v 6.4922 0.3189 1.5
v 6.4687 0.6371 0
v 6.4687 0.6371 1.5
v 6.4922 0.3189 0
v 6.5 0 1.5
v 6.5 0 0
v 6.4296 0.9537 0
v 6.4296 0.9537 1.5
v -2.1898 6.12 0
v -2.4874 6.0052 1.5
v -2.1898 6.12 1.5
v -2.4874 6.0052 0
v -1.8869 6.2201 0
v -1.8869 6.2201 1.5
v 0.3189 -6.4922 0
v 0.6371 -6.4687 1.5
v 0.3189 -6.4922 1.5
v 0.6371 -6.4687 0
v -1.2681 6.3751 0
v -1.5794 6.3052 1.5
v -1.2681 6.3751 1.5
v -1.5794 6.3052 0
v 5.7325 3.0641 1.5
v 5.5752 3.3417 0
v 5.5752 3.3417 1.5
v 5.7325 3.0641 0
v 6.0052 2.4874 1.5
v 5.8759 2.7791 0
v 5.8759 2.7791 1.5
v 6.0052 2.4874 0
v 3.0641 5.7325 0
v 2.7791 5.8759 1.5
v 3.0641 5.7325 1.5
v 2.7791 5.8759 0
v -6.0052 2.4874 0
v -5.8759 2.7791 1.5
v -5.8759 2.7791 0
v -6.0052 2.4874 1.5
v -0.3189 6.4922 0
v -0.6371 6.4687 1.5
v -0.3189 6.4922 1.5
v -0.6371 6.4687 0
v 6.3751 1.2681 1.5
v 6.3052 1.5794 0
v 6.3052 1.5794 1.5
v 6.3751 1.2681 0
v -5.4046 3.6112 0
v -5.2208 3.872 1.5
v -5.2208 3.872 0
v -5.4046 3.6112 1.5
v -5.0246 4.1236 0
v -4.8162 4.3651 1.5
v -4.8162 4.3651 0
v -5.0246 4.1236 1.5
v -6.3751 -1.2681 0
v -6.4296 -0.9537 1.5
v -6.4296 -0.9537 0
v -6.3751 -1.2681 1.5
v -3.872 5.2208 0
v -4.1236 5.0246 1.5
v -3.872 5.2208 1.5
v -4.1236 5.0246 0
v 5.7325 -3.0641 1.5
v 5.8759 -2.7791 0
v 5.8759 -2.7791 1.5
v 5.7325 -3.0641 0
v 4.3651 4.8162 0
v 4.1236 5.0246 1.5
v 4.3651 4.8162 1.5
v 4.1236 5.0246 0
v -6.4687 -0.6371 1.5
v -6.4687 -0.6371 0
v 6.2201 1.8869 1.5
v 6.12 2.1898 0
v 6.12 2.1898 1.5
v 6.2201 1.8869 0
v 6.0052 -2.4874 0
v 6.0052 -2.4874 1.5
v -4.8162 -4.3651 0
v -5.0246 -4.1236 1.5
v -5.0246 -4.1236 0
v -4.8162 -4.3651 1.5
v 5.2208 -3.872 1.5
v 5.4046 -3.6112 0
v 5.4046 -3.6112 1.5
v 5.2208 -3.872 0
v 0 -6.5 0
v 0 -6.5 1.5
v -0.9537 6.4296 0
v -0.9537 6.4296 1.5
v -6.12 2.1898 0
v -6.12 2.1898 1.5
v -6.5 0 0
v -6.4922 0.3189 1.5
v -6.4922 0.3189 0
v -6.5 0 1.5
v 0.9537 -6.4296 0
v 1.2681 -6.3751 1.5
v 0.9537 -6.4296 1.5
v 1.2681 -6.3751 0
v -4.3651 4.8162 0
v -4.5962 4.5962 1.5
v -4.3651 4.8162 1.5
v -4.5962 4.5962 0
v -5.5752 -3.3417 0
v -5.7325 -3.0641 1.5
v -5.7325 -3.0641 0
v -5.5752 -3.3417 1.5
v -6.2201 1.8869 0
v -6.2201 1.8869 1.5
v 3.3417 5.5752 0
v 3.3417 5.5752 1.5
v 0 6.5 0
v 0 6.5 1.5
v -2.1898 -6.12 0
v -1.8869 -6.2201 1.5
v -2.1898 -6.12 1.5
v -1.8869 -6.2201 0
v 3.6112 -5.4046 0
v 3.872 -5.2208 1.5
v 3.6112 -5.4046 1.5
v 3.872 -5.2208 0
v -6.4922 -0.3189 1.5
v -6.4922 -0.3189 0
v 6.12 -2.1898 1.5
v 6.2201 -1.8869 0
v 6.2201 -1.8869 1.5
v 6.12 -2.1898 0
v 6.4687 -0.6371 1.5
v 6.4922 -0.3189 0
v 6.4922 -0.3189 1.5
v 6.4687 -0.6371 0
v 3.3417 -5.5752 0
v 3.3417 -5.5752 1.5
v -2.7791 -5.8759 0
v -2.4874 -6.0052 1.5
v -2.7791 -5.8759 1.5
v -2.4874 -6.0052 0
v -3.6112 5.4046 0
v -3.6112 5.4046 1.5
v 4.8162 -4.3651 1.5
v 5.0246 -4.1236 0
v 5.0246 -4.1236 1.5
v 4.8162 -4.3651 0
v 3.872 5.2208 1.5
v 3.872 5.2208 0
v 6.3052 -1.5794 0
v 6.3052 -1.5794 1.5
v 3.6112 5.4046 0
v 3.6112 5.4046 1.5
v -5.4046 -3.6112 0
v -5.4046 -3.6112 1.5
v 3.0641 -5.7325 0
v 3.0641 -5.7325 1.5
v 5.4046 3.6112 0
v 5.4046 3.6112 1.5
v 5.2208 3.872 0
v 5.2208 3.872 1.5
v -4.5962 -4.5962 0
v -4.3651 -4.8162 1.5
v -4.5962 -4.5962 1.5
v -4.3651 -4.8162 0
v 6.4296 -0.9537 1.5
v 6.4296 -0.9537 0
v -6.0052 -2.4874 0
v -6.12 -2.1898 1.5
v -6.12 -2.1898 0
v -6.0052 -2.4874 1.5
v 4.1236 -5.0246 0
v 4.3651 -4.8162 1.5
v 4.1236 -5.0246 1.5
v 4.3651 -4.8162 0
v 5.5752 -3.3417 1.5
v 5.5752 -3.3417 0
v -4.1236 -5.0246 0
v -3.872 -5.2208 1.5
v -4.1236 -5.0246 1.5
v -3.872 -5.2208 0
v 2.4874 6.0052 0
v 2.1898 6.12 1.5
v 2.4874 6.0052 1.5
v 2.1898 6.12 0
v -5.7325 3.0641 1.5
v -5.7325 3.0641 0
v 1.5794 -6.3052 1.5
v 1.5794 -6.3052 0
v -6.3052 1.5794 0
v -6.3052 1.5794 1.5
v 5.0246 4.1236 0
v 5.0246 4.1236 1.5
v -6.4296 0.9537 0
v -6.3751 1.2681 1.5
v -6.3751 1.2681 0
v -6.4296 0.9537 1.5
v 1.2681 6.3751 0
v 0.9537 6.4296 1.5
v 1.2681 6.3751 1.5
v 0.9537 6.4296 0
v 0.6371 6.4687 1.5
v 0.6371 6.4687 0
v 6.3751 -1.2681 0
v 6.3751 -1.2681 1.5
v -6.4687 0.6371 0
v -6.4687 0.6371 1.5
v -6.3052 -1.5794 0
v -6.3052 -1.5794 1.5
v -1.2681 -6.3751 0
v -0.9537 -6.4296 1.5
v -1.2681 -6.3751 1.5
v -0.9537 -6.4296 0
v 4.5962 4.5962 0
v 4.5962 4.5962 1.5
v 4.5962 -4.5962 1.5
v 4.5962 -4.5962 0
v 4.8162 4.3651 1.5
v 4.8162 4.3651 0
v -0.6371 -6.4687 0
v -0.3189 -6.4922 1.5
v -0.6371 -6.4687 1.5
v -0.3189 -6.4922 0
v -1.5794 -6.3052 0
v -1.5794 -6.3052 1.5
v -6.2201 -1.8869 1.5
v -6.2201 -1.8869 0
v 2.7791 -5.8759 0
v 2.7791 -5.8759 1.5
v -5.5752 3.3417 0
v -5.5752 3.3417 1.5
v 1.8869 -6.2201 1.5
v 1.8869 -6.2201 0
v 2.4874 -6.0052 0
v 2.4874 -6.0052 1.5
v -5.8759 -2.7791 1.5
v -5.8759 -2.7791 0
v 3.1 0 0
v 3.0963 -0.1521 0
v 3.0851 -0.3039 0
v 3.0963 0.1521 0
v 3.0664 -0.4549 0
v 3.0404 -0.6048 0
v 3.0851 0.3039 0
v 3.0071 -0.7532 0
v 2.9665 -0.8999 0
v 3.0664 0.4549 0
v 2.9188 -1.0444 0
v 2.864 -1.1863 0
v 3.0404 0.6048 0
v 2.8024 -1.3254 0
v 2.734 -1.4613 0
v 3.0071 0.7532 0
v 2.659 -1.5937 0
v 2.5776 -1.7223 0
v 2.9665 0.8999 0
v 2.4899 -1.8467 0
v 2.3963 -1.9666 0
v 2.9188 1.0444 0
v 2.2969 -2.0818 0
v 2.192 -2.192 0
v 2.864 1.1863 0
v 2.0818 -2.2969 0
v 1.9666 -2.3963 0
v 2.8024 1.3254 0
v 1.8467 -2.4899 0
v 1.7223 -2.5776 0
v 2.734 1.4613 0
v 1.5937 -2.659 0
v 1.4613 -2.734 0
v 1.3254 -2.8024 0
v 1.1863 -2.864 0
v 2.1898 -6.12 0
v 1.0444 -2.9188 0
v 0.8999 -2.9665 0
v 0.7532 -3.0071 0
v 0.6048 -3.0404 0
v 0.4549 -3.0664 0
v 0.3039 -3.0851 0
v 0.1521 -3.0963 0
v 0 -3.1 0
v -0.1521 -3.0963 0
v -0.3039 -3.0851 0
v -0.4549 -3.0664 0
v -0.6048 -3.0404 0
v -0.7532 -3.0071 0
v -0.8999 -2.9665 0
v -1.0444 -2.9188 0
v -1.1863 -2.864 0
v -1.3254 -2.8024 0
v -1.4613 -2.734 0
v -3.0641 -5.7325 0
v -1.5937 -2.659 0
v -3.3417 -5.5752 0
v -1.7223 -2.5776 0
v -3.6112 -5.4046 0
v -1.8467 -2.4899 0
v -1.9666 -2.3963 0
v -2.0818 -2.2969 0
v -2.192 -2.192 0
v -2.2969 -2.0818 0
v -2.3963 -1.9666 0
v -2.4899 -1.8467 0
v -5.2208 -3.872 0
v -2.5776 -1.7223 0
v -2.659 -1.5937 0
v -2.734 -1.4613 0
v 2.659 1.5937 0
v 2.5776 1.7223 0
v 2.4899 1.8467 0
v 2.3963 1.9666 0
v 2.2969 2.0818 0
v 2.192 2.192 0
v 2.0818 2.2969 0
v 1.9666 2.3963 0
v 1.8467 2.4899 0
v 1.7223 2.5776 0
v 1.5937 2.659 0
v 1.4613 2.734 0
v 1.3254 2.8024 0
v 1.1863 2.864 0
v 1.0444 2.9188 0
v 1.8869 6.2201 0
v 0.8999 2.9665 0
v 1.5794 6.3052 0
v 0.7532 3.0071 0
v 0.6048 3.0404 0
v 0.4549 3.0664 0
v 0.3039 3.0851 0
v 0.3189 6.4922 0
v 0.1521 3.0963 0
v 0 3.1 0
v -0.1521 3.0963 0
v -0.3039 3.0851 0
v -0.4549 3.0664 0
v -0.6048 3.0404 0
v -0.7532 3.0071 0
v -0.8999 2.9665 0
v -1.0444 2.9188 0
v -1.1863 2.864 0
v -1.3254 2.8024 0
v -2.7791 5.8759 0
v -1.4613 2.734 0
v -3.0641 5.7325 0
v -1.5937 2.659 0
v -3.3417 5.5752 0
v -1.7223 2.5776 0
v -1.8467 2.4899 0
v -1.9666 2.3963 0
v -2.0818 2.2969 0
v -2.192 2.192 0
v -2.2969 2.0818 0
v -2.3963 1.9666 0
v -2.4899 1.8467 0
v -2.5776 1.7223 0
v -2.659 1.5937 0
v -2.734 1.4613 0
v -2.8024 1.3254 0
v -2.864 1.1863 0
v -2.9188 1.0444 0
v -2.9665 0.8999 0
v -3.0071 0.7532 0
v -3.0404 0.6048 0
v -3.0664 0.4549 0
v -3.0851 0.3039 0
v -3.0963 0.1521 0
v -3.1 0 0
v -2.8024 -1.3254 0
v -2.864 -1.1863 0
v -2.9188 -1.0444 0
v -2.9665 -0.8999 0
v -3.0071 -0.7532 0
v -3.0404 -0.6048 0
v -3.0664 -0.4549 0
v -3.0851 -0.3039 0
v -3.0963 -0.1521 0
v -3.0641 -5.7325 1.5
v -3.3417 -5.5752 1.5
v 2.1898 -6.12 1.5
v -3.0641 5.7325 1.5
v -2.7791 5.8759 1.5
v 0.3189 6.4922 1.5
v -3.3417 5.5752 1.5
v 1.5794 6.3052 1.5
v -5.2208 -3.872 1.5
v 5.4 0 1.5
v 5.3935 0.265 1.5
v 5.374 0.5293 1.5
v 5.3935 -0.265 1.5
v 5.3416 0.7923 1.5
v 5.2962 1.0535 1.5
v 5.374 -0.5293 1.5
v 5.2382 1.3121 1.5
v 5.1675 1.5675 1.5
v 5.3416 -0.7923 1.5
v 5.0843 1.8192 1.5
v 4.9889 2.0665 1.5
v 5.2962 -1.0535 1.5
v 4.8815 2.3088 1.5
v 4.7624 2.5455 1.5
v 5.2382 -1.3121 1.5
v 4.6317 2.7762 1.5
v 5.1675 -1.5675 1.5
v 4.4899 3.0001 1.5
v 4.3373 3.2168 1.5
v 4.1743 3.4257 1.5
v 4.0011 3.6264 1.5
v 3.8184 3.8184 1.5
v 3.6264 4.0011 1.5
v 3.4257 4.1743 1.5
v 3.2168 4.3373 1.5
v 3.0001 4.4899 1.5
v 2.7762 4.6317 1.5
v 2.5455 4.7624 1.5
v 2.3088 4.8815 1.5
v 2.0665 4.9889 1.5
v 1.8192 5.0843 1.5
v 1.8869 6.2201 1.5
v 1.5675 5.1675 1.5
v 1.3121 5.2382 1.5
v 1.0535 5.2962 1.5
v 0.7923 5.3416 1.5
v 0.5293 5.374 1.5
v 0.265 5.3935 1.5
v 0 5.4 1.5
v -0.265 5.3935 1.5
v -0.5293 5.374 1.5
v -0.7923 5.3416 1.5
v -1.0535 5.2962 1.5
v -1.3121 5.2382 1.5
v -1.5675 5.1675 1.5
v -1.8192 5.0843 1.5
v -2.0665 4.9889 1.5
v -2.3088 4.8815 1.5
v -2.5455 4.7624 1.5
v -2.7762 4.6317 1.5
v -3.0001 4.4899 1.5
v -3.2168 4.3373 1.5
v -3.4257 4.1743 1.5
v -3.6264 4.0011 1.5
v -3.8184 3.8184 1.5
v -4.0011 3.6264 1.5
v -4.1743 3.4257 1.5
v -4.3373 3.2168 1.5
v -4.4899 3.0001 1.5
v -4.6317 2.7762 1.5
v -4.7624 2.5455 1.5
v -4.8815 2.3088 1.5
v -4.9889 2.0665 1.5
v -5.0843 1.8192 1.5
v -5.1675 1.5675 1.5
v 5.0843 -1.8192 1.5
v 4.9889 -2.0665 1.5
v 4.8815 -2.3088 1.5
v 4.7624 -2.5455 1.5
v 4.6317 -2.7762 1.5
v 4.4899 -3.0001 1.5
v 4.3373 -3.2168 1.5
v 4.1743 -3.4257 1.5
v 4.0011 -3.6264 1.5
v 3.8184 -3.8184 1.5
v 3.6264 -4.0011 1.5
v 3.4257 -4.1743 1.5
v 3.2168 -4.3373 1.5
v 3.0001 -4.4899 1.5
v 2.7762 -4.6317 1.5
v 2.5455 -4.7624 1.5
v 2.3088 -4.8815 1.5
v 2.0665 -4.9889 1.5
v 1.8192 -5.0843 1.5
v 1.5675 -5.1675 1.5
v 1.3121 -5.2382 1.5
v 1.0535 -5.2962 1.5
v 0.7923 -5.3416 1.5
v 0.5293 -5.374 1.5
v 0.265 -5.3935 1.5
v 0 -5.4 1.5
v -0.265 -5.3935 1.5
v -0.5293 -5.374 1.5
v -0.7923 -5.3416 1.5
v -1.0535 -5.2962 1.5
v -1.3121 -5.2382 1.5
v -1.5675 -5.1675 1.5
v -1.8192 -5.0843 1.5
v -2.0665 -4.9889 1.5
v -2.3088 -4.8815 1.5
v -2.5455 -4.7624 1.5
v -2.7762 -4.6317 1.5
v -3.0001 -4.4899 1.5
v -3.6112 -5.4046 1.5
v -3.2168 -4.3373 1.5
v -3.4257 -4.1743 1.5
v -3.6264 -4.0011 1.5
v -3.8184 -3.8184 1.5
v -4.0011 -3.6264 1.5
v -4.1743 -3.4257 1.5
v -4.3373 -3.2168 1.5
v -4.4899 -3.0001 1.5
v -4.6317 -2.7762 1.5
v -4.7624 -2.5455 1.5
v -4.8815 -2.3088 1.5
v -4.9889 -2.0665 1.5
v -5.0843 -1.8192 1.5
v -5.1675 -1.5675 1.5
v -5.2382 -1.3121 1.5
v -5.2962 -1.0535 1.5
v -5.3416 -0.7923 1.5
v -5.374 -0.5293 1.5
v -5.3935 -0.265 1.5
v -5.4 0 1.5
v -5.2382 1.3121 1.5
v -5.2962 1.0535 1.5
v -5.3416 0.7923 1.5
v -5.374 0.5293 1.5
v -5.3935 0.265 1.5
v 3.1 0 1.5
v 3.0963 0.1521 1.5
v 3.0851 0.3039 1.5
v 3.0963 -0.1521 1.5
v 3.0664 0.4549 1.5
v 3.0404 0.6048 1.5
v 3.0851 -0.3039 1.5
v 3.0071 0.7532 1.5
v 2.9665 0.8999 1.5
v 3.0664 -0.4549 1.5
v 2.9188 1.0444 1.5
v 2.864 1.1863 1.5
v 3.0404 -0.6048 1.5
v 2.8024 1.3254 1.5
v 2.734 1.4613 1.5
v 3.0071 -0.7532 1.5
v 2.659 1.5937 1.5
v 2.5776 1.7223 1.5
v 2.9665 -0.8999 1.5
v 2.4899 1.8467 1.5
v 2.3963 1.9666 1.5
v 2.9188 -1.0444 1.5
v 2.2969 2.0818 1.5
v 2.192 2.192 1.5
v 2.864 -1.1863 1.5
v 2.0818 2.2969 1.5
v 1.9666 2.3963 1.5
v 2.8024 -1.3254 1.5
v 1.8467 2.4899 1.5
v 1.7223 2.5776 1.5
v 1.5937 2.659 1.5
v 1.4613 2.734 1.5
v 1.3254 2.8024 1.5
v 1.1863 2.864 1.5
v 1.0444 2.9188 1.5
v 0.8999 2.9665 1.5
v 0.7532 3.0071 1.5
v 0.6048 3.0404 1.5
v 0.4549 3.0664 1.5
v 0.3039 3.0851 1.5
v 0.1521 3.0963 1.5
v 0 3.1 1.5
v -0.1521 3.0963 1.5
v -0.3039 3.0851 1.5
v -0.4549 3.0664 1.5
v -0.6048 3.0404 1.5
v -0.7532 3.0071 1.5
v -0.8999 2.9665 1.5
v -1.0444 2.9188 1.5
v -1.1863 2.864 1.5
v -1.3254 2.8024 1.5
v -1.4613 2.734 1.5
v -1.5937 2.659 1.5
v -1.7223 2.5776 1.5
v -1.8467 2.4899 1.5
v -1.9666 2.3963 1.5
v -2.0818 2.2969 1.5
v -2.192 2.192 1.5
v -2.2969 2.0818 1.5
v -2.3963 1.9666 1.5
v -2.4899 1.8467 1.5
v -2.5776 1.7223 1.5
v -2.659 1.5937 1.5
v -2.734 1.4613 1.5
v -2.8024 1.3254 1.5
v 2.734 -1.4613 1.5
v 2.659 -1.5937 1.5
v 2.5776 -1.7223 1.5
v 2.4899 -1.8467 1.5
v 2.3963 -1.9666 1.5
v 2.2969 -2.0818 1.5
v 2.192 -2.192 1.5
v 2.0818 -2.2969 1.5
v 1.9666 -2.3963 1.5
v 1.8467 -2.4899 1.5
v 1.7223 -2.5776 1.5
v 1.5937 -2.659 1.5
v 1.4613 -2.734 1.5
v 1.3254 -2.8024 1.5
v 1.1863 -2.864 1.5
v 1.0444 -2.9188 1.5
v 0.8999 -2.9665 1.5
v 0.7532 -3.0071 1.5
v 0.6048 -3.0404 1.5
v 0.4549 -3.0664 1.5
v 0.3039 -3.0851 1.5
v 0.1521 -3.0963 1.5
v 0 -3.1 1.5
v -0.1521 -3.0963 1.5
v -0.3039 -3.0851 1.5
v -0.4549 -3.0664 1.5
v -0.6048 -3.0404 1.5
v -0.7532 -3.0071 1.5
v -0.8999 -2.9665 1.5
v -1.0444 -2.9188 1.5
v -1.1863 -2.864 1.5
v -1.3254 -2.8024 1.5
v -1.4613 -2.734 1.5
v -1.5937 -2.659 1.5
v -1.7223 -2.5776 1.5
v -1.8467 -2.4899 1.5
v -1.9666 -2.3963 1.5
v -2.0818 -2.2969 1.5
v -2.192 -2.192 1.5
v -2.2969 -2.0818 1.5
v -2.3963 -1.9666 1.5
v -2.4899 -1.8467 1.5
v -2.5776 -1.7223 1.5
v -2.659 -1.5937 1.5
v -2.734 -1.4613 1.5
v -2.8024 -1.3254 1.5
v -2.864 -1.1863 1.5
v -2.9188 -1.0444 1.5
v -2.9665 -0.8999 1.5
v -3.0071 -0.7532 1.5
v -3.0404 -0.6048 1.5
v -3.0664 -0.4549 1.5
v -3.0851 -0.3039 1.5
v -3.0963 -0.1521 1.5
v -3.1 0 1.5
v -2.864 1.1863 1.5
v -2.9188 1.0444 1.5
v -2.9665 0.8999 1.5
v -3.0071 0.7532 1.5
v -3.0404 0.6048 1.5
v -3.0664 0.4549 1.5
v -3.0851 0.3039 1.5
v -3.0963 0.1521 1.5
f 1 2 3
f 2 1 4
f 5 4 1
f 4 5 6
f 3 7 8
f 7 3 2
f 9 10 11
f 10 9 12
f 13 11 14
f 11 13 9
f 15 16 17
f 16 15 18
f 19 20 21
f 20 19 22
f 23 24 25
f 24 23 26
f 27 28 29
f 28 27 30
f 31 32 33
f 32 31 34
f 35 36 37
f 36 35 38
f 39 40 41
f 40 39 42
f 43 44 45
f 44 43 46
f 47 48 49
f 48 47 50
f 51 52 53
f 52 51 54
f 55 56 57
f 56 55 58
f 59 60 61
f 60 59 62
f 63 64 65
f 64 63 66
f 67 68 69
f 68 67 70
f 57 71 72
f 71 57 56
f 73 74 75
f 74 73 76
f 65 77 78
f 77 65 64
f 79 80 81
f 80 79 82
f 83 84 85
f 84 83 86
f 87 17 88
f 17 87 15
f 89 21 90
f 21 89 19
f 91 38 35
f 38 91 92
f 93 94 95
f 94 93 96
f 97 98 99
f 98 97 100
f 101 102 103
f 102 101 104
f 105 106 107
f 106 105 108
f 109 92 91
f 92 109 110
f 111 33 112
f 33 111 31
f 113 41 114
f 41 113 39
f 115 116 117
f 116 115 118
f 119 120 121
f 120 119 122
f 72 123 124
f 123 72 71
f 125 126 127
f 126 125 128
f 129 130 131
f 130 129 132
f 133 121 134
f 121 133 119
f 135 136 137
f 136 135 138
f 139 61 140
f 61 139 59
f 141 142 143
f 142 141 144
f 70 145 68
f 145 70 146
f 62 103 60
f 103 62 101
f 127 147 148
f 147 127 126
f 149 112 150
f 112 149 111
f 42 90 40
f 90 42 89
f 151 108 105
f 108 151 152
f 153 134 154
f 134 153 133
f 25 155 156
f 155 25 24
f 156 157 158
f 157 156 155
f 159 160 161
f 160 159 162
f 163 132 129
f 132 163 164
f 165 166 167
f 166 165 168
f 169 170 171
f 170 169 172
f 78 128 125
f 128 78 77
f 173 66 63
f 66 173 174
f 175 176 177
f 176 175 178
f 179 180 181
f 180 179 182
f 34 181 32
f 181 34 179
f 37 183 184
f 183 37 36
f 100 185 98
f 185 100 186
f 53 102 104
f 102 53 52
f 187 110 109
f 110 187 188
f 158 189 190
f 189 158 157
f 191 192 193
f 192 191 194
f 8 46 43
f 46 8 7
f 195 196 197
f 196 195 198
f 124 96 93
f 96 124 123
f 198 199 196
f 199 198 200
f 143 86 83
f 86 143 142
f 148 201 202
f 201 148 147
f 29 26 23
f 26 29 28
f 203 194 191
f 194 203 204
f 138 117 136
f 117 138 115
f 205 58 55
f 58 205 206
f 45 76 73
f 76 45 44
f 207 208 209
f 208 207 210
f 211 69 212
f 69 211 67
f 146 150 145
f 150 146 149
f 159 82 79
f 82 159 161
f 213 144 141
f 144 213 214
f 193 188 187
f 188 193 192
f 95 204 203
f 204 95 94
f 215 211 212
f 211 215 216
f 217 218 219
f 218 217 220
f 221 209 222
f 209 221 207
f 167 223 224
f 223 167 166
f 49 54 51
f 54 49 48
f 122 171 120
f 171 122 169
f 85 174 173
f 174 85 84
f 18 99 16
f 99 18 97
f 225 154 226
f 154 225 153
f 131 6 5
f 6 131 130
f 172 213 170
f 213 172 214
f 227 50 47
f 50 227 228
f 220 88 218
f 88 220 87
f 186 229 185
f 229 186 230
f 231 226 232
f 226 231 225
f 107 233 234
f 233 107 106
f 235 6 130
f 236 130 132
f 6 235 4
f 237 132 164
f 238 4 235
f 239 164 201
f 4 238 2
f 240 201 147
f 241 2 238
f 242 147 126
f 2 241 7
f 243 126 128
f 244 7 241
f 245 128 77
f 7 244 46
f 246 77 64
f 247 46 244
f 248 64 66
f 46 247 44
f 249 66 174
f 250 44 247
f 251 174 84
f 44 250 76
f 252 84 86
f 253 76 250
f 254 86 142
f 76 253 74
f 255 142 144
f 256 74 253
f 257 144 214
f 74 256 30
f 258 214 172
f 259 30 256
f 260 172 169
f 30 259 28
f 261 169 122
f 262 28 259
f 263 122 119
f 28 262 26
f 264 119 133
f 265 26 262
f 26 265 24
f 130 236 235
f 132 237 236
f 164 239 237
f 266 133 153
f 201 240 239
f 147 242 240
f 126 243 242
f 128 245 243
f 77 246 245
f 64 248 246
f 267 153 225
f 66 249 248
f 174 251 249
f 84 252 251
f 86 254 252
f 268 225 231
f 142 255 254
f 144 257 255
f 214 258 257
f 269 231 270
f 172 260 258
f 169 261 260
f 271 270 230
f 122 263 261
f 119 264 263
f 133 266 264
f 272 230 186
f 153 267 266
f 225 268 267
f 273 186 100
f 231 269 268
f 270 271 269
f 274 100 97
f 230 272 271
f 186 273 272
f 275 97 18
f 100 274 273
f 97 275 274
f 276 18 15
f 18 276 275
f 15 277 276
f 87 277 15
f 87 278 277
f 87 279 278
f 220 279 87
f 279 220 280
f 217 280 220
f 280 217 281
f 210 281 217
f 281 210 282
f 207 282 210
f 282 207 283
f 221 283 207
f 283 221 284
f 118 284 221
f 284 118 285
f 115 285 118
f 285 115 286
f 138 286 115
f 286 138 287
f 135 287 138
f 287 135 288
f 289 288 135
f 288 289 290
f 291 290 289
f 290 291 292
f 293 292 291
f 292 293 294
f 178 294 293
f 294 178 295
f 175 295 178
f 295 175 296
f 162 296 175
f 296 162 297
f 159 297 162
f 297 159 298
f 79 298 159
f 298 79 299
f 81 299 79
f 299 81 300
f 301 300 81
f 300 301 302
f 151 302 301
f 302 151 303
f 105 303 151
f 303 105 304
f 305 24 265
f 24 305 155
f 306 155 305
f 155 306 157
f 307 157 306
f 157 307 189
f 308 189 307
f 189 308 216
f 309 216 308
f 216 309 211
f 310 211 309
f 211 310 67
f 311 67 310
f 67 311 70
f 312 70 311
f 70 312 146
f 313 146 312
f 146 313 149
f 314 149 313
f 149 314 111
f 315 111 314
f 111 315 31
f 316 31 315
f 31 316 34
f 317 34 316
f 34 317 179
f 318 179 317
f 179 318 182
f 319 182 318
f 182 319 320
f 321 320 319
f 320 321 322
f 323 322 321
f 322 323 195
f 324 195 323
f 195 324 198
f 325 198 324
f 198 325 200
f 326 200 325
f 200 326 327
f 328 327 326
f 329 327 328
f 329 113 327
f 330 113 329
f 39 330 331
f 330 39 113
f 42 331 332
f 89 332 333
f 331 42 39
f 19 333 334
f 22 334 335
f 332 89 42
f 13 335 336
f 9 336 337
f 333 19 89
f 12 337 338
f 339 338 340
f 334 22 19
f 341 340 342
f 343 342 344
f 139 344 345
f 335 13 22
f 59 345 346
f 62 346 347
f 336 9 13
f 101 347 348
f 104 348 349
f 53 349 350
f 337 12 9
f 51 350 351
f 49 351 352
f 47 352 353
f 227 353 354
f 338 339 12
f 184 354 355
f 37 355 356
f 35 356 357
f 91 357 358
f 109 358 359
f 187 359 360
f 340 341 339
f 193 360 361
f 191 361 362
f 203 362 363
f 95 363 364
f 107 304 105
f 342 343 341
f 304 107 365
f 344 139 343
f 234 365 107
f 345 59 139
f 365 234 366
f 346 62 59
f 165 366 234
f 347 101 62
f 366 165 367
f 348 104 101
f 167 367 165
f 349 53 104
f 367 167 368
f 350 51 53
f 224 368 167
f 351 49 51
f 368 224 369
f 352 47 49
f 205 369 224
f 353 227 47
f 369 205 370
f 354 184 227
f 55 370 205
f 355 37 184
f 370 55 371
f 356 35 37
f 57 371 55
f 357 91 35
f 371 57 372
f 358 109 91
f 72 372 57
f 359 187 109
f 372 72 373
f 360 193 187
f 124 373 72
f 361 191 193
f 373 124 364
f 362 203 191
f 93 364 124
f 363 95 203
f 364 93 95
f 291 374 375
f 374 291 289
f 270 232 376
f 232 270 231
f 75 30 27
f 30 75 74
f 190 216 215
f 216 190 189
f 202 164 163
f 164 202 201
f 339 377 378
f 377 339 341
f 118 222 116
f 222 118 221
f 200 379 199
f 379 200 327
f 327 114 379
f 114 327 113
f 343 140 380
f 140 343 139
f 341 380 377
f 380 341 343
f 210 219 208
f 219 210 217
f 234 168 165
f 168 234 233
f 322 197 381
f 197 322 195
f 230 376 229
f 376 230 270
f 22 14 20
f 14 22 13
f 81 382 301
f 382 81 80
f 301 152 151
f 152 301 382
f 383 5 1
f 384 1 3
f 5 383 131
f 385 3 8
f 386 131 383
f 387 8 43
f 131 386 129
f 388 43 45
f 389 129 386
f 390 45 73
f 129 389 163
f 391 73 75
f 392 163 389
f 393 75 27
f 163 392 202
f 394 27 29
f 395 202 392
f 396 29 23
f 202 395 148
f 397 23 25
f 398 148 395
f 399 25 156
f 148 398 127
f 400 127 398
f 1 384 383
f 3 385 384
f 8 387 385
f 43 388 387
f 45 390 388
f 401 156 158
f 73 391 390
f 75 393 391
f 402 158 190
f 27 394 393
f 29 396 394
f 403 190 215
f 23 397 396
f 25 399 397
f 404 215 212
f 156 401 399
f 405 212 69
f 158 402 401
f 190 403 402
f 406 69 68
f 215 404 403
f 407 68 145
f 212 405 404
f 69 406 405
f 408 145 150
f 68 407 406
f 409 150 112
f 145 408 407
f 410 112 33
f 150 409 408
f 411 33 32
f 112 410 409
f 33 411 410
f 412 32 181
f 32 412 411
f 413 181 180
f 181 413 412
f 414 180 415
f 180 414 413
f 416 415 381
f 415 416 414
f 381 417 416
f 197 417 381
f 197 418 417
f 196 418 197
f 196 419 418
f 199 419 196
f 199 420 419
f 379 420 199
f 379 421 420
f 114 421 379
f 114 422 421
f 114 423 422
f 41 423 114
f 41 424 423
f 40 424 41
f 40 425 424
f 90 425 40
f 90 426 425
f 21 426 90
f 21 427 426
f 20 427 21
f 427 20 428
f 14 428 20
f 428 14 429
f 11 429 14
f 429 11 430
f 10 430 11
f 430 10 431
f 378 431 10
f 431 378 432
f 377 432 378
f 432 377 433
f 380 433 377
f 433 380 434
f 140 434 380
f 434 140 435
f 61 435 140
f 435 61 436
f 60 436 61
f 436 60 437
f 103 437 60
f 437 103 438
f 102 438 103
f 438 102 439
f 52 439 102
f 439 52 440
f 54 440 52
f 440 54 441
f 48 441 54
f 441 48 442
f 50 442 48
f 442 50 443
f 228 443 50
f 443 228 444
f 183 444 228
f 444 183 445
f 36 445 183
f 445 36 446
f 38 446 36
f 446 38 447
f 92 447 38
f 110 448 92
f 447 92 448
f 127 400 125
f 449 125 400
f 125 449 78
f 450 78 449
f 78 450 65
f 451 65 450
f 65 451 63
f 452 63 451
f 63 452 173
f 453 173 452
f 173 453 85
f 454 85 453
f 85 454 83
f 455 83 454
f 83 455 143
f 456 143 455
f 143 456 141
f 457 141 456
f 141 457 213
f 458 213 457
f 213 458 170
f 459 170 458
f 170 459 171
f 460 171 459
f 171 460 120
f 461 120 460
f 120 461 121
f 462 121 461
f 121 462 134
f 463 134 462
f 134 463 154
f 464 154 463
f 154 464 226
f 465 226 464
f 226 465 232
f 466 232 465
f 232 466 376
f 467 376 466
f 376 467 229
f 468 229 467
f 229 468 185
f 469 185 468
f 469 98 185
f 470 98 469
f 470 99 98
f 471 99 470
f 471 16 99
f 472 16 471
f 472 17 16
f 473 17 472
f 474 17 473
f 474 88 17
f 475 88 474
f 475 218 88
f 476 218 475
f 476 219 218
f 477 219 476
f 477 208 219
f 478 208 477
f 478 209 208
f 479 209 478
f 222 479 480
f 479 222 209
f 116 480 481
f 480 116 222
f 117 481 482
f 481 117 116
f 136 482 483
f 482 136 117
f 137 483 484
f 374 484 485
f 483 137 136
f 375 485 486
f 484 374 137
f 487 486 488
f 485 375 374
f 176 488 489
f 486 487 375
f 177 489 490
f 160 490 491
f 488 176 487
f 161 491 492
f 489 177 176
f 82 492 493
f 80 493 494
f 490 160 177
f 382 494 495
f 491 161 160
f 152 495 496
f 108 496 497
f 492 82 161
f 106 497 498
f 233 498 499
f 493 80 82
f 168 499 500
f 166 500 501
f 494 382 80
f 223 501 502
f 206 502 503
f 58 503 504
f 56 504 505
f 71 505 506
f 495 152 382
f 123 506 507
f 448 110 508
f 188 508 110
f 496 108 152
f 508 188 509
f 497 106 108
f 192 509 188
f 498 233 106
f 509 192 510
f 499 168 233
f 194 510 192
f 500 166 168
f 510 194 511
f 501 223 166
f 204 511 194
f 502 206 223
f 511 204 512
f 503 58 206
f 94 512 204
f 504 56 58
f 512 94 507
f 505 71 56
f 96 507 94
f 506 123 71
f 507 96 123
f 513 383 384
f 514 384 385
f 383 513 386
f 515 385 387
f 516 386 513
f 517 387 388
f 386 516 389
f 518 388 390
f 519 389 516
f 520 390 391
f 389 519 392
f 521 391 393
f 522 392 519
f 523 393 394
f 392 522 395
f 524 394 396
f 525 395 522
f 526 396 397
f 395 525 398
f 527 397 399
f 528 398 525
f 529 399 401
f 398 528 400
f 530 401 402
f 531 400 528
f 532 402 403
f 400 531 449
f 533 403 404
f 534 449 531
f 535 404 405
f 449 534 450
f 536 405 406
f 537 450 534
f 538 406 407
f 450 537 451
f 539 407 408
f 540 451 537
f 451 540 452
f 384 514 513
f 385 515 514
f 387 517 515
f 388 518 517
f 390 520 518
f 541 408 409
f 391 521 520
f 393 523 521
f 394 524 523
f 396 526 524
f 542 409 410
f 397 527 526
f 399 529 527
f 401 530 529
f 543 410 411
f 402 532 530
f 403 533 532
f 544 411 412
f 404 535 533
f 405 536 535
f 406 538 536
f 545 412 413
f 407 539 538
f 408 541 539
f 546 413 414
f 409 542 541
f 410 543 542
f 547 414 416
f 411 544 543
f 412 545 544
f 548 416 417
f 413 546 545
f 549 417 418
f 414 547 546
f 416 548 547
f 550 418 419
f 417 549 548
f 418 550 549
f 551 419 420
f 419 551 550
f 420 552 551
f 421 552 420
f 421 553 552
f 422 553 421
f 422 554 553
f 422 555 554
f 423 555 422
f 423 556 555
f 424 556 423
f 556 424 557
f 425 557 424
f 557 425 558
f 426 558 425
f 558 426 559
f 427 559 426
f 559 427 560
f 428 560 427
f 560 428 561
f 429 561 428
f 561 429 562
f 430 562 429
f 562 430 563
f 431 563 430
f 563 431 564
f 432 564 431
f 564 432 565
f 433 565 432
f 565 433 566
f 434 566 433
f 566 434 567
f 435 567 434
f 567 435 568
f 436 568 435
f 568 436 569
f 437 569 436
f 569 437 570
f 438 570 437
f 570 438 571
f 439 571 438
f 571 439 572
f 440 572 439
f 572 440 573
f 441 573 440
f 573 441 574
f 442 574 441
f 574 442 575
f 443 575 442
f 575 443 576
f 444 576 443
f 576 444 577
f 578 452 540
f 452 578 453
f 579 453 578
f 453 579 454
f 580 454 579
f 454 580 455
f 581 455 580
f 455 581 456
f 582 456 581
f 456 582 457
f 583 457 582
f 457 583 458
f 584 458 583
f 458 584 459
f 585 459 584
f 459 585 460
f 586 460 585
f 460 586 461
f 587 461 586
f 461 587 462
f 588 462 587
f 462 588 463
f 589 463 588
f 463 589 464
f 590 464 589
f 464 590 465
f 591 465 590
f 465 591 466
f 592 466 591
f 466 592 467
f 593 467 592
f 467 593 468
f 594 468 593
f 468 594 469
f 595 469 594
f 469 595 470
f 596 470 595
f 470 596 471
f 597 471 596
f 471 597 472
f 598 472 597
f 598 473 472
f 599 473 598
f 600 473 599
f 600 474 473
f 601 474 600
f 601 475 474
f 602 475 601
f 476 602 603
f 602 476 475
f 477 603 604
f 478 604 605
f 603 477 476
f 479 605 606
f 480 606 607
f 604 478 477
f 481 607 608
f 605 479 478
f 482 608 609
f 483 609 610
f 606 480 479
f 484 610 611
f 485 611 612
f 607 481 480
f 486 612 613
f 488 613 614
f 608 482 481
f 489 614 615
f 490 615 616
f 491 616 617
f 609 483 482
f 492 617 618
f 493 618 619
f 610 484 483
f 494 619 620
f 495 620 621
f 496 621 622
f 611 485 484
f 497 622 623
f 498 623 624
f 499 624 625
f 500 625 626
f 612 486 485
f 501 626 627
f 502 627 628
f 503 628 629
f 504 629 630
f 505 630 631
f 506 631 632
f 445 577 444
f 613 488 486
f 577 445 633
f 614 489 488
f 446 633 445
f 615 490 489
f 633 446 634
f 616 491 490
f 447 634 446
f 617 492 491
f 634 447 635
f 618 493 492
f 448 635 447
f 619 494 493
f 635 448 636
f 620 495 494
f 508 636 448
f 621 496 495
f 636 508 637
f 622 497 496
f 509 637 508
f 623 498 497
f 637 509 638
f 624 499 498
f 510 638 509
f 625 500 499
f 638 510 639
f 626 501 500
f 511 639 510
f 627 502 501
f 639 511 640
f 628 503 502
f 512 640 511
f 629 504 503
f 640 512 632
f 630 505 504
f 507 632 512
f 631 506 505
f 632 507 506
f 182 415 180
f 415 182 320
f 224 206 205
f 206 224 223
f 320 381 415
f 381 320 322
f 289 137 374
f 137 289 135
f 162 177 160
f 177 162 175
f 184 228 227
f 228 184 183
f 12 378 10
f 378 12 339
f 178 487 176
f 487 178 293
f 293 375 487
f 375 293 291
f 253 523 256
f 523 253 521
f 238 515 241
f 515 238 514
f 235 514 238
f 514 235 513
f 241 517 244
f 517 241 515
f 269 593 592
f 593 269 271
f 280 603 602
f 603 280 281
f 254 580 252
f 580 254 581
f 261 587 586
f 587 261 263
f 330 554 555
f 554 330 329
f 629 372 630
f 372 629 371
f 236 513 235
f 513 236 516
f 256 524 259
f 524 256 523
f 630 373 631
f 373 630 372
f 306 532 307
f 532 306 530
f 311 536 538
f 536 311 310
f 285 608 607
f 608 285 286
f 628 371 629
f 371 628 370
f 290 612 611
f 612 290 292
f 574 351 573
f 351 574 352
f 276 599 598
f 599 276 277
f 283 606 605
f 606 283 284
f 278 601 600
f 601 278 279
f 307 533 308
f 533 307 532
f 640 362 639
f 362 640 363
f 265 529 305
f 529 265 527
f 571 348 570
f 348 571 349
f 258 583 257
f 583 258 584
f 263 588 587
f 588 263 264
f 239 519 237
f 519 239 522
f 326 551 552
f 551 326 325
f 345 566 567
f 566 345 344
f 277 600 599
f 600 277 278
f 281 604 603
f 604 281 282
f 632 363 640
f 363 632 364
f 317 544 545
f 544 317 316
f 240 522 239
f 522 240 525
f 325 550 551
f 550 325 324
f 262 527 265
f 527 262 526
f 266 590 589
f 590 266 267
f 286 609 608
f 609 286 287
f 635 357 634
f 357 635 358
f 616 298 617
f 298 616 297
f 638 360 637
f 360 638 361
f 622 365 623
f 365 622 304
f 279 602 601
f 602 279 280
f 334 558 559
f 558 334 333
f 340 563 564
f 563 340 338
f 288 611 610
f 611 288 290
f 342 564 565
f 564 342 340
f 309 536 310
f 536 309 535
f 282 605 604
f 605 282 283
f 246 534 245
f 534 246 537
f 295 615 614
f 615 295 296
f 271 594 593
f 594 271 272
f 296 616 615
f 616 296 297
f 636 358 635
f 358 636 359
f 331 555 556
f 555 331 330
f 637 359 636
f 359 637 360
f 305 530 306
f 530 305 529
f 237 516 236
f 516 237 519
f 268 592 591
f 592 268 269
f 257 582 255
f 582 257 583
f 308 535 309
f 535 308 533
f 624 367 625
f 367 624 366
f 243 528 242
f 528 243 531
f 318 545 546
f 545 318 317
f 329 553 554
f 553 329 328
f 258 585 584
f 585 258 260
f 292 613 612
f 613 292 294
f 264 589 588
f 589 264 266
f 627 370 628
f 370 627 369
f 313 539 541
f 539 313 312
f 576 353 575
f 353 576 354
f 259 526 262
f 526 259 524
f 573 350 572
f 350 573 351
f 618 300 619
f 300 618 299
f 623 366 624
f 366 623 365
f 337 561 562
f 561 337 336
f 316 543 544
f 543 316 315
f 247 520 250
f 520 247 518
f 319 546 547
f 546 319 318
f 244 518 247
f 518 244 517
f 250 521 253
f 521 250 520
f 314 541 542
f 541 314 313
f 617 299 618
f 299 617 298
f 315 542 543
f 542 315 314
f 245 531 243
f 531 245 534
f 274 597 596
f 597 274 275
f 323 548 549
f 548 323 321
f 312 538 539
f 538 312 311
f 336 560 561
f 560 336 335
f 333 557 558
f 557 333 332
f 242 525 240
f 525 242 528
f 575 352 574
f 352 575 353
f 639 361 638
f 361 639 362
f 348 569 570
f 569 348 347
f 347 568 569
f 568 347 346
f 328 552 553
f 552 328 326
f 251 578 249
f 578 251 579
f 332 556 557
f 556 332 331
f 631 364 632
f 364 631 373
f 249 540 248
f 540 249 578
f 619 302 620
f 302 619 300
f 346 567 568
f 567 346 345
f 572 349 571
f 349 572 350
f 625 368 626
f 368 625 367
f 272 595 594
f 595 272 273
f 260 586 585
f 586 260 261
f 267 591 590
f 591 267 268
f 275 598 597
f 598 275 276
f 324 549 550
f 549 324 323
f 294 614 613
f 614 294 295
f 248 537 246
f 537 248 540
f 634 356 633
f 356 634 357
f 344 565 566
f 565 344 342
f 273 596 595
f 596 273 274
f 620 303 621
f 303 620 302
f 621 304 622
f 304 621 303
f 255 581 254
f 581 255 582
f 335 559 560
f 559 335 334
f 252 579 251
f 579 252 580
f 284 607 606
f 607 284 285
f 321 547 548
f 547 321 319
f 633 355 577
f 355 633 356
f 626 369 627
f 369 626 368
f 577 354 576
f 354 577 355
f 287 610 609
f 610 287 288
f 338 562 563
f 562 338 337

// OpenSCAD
// Adapter Sleeve for 0.2 mL PCR tube in 1.5 mL rack
// Print orientation: Upside down (Collar on bed)
// Units: mm

// Dimensions
$fn = 128; // High resolution for smooth curves and accurate holes

// Collar (Base)
$collar_diameter = 13.0;
$collar_thickness = 1.5;

// Sleeve Body
$sleeve_outer_diameter = 10.8;
$sleeve_total_height = 21.5;

// Bore
$bore_diameter = 6.2;

// Overcuts for clean printing (Rule 5)
$overcut = 0.1;

// Calculate derived dimensions
$collar_radius = $collar_diameter / 2;
$sleeve_outer_radius = $sleeve_outer_diameter / 2;
$bore_radius = $bore_diameter / 2;

// Main Body Construction
// We build the collar first, then union the sleeve body on top.
// The sleeve body extends from z=0 to z=sleeve_total_height.
// The collar is effectively the bottom part of this assembly.

difference() {
    // 1. Create the outer shell (Collar + Sleeve Body)
    // We use a cylinder for the main body and a smaller cylinder for the collar top if needed,
    // but since the collar is wider, we can model the whole thing as a stepped cylinder.
    
    // Outer Shell:
    // Bottom part (Collar): Radius = $collar_radius, Height = $collar_thickness
    // Top part (Sleeve): Radius = $sleeve_outer_radius, Height = ($sleeve_total_height - $collar_thickness)
    
    // To make it one solid piece easily, we can extrude a polygon or use two cylinders.
    // Using two cylinders unioned is robust.
    
    // Collar Cylinder (Base)
    translate([0, 0, 0])
    cylinder(
        h = $collar_thickness,
        r1 = $collar_radius,
        r2 = $collar_radius,
        $fn = $fn
    );
    
    // Sleeve Body Cylinder (Rising from collar)
    translate([0, 0, $collar_thickness])
    cylinder(
        h = ($sleeve_total_height - $collar_thickness),
        r1 = $sleeve_outer_radius,
        r2 = $sleeve_outer_radius,
        $fn = $fn
    );
    
    // 2. Cut the Bore
    // The bore runs through the full height ($sleeve_total_height)
    // We extend the cutter slightly past the top and bottom to ensure clean cuts (Rule 5)
    translate([0, 0, -($overcut)])
    cylinder(
        h = ($sleeve_total_height + ($overcut * 2)),
        r = $bore_radius,
        $fn = $fn
    );
}
